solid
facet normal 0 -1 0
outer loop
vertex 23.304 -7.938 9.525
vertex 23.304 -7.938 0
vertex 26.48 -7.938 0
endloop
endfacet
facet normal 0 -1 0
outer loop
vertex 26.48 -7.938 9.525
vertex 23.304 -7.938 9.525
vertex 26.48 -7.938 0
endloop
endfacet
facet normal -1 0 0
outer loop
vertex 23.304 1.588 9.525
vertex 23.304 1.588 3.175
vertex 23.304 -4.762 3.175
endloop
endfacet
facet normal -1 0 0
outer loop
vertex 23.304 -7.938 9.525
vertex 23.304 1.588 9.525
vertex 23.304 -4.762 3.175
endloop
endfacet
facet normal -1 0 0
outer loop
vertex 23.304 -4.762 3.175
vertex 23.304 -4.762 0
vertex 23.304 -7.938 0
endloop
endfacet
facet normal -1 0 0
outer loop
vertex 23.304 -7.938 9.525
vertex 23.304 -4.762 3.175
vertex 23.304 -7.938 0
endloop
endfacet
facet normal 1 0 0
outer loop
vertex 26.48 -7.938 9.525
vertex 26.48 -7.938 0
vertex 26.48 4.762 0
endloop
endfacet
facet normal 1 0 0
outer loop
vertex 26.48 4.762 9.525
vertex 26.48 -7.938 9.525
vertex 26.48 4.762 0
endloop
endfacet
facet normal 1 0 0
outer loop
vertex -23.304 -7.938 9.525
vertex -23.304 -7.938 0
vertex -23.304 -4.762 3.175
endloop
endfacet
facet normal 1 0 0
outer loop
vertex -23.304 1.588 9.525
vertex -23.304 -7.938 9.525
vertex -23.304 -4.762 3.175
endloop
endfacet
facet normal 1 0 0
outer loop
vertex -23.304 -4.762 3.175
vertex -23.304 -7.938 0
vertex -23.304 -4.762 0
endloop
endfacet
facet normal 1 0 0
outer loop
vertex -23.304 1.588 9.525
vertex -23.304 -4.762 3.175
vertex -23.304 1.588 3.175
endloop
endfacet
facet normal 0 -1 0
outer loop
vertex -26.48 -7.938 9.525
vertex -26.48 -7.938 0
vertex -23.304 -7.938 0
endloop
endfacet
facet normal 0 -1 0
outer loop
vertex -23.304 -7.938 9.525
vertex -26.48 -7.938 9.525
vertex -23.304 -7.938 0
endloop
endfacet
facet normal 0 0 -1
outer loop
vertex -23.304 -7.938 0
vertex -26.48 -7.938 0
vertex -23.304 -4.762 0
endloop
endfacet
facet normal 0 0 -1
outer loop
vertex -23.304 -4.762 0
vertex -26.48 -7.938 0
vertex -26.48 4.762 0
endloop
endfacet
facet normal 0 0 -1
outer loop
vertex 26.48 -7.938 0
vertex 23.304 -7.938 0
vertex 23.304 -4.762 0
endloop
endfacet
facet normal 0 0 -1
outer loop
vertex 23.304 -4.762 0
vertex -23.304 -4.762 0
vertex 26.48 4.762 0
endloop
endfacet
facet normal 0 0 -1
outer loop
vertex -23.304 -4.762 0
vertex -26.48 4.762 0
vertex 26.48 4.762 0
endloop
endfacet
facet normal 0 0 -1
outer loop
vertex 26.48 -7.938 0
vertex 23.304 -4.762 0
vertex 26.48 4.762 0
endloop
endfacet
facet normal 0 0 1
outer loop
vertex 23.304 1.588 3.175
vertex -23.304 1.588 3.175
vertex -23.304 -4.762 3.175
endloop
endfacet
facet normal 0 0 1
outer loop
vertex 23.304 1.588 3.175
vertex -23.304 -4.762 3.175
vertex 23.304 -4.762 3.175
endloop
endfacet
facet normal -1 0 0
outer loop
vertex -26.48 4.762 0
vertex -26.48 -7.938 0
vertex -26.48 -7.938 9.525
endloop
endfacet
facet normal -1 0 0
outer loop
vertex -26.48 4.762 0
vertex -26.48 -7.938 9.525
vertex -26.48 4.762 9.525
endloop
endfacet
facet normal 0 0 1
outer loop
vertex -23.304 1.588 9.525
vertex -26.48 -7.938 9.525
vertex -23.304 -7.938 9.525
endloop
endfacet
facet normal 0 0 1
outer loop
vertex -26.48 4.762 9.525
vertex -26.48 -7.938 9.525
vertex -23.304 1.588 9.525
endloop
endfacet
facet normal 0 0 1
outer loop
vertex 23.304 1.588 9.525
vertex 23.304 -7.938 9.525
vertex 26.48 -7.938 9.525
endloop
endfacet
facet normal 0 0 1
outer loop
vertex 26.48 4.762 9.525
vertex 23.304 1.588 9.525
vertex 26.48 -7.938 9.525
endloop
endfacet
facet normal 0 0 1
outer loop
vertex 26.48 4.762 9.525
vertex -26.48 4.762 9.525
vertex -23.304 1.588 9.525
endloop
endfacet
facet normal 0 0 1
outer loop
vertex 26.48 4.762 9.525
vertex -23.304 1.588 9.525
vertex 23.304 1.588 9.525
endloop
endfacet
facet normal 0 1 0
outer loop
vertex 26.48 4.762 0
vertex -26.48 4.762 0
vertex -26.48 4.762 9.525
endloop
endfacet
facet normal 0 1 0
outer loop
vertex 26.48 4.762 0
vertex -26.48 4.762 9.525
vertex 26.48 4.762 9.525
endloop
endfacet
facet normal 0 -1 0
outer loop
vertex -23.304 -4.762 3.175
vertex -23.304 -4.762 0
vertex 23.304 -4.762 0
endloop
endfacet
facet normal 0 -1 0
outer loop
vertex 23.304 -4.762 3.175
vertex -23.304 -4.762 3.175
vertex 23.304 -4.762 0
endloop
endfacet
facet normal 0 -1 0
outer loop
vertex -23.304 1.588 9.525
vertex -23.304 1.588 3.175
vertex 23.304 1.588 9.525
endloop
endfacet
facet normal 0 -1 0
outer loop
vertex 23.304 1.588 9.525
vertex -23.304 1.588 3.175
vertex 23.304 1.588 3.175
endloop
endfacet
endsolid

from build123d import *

# Parameters (mm, degrees)
SKETCH1_W           = 52.959
SKETCH1_H           = 9.525
BOSS_EXTRUDE3_DEPTH = 3.175
BOSS_EXTRUDE4_DEPTH = 9.525


with BuildPart() as part:
    # Sketch1 → Boss-Extrude3 (new body)
    with BuildSketch(Plane.XY):
        Rectangle(SKETCH1_W, SKETCH1_H)
    extrude(amount=BOSS_EXTRUDE3_DEPTH)

    # Sketch2 → Boss-Extrude4 (add)
    with BuildSketch(Plane.XY):
        Polygon((-26.4795, 4.7625), (-26.4795, -7.9375), (-23.3045, -7.9375), (-23.3045, 1.5875), (23.3045, 1.5875), (23.3045, -7.9375), (26.4795, -7.9375), (26.4795, 4.7625), align=None)
    extrude(amount=BOSS_EXTRUDE4_DEPTH)


solid = part.part
